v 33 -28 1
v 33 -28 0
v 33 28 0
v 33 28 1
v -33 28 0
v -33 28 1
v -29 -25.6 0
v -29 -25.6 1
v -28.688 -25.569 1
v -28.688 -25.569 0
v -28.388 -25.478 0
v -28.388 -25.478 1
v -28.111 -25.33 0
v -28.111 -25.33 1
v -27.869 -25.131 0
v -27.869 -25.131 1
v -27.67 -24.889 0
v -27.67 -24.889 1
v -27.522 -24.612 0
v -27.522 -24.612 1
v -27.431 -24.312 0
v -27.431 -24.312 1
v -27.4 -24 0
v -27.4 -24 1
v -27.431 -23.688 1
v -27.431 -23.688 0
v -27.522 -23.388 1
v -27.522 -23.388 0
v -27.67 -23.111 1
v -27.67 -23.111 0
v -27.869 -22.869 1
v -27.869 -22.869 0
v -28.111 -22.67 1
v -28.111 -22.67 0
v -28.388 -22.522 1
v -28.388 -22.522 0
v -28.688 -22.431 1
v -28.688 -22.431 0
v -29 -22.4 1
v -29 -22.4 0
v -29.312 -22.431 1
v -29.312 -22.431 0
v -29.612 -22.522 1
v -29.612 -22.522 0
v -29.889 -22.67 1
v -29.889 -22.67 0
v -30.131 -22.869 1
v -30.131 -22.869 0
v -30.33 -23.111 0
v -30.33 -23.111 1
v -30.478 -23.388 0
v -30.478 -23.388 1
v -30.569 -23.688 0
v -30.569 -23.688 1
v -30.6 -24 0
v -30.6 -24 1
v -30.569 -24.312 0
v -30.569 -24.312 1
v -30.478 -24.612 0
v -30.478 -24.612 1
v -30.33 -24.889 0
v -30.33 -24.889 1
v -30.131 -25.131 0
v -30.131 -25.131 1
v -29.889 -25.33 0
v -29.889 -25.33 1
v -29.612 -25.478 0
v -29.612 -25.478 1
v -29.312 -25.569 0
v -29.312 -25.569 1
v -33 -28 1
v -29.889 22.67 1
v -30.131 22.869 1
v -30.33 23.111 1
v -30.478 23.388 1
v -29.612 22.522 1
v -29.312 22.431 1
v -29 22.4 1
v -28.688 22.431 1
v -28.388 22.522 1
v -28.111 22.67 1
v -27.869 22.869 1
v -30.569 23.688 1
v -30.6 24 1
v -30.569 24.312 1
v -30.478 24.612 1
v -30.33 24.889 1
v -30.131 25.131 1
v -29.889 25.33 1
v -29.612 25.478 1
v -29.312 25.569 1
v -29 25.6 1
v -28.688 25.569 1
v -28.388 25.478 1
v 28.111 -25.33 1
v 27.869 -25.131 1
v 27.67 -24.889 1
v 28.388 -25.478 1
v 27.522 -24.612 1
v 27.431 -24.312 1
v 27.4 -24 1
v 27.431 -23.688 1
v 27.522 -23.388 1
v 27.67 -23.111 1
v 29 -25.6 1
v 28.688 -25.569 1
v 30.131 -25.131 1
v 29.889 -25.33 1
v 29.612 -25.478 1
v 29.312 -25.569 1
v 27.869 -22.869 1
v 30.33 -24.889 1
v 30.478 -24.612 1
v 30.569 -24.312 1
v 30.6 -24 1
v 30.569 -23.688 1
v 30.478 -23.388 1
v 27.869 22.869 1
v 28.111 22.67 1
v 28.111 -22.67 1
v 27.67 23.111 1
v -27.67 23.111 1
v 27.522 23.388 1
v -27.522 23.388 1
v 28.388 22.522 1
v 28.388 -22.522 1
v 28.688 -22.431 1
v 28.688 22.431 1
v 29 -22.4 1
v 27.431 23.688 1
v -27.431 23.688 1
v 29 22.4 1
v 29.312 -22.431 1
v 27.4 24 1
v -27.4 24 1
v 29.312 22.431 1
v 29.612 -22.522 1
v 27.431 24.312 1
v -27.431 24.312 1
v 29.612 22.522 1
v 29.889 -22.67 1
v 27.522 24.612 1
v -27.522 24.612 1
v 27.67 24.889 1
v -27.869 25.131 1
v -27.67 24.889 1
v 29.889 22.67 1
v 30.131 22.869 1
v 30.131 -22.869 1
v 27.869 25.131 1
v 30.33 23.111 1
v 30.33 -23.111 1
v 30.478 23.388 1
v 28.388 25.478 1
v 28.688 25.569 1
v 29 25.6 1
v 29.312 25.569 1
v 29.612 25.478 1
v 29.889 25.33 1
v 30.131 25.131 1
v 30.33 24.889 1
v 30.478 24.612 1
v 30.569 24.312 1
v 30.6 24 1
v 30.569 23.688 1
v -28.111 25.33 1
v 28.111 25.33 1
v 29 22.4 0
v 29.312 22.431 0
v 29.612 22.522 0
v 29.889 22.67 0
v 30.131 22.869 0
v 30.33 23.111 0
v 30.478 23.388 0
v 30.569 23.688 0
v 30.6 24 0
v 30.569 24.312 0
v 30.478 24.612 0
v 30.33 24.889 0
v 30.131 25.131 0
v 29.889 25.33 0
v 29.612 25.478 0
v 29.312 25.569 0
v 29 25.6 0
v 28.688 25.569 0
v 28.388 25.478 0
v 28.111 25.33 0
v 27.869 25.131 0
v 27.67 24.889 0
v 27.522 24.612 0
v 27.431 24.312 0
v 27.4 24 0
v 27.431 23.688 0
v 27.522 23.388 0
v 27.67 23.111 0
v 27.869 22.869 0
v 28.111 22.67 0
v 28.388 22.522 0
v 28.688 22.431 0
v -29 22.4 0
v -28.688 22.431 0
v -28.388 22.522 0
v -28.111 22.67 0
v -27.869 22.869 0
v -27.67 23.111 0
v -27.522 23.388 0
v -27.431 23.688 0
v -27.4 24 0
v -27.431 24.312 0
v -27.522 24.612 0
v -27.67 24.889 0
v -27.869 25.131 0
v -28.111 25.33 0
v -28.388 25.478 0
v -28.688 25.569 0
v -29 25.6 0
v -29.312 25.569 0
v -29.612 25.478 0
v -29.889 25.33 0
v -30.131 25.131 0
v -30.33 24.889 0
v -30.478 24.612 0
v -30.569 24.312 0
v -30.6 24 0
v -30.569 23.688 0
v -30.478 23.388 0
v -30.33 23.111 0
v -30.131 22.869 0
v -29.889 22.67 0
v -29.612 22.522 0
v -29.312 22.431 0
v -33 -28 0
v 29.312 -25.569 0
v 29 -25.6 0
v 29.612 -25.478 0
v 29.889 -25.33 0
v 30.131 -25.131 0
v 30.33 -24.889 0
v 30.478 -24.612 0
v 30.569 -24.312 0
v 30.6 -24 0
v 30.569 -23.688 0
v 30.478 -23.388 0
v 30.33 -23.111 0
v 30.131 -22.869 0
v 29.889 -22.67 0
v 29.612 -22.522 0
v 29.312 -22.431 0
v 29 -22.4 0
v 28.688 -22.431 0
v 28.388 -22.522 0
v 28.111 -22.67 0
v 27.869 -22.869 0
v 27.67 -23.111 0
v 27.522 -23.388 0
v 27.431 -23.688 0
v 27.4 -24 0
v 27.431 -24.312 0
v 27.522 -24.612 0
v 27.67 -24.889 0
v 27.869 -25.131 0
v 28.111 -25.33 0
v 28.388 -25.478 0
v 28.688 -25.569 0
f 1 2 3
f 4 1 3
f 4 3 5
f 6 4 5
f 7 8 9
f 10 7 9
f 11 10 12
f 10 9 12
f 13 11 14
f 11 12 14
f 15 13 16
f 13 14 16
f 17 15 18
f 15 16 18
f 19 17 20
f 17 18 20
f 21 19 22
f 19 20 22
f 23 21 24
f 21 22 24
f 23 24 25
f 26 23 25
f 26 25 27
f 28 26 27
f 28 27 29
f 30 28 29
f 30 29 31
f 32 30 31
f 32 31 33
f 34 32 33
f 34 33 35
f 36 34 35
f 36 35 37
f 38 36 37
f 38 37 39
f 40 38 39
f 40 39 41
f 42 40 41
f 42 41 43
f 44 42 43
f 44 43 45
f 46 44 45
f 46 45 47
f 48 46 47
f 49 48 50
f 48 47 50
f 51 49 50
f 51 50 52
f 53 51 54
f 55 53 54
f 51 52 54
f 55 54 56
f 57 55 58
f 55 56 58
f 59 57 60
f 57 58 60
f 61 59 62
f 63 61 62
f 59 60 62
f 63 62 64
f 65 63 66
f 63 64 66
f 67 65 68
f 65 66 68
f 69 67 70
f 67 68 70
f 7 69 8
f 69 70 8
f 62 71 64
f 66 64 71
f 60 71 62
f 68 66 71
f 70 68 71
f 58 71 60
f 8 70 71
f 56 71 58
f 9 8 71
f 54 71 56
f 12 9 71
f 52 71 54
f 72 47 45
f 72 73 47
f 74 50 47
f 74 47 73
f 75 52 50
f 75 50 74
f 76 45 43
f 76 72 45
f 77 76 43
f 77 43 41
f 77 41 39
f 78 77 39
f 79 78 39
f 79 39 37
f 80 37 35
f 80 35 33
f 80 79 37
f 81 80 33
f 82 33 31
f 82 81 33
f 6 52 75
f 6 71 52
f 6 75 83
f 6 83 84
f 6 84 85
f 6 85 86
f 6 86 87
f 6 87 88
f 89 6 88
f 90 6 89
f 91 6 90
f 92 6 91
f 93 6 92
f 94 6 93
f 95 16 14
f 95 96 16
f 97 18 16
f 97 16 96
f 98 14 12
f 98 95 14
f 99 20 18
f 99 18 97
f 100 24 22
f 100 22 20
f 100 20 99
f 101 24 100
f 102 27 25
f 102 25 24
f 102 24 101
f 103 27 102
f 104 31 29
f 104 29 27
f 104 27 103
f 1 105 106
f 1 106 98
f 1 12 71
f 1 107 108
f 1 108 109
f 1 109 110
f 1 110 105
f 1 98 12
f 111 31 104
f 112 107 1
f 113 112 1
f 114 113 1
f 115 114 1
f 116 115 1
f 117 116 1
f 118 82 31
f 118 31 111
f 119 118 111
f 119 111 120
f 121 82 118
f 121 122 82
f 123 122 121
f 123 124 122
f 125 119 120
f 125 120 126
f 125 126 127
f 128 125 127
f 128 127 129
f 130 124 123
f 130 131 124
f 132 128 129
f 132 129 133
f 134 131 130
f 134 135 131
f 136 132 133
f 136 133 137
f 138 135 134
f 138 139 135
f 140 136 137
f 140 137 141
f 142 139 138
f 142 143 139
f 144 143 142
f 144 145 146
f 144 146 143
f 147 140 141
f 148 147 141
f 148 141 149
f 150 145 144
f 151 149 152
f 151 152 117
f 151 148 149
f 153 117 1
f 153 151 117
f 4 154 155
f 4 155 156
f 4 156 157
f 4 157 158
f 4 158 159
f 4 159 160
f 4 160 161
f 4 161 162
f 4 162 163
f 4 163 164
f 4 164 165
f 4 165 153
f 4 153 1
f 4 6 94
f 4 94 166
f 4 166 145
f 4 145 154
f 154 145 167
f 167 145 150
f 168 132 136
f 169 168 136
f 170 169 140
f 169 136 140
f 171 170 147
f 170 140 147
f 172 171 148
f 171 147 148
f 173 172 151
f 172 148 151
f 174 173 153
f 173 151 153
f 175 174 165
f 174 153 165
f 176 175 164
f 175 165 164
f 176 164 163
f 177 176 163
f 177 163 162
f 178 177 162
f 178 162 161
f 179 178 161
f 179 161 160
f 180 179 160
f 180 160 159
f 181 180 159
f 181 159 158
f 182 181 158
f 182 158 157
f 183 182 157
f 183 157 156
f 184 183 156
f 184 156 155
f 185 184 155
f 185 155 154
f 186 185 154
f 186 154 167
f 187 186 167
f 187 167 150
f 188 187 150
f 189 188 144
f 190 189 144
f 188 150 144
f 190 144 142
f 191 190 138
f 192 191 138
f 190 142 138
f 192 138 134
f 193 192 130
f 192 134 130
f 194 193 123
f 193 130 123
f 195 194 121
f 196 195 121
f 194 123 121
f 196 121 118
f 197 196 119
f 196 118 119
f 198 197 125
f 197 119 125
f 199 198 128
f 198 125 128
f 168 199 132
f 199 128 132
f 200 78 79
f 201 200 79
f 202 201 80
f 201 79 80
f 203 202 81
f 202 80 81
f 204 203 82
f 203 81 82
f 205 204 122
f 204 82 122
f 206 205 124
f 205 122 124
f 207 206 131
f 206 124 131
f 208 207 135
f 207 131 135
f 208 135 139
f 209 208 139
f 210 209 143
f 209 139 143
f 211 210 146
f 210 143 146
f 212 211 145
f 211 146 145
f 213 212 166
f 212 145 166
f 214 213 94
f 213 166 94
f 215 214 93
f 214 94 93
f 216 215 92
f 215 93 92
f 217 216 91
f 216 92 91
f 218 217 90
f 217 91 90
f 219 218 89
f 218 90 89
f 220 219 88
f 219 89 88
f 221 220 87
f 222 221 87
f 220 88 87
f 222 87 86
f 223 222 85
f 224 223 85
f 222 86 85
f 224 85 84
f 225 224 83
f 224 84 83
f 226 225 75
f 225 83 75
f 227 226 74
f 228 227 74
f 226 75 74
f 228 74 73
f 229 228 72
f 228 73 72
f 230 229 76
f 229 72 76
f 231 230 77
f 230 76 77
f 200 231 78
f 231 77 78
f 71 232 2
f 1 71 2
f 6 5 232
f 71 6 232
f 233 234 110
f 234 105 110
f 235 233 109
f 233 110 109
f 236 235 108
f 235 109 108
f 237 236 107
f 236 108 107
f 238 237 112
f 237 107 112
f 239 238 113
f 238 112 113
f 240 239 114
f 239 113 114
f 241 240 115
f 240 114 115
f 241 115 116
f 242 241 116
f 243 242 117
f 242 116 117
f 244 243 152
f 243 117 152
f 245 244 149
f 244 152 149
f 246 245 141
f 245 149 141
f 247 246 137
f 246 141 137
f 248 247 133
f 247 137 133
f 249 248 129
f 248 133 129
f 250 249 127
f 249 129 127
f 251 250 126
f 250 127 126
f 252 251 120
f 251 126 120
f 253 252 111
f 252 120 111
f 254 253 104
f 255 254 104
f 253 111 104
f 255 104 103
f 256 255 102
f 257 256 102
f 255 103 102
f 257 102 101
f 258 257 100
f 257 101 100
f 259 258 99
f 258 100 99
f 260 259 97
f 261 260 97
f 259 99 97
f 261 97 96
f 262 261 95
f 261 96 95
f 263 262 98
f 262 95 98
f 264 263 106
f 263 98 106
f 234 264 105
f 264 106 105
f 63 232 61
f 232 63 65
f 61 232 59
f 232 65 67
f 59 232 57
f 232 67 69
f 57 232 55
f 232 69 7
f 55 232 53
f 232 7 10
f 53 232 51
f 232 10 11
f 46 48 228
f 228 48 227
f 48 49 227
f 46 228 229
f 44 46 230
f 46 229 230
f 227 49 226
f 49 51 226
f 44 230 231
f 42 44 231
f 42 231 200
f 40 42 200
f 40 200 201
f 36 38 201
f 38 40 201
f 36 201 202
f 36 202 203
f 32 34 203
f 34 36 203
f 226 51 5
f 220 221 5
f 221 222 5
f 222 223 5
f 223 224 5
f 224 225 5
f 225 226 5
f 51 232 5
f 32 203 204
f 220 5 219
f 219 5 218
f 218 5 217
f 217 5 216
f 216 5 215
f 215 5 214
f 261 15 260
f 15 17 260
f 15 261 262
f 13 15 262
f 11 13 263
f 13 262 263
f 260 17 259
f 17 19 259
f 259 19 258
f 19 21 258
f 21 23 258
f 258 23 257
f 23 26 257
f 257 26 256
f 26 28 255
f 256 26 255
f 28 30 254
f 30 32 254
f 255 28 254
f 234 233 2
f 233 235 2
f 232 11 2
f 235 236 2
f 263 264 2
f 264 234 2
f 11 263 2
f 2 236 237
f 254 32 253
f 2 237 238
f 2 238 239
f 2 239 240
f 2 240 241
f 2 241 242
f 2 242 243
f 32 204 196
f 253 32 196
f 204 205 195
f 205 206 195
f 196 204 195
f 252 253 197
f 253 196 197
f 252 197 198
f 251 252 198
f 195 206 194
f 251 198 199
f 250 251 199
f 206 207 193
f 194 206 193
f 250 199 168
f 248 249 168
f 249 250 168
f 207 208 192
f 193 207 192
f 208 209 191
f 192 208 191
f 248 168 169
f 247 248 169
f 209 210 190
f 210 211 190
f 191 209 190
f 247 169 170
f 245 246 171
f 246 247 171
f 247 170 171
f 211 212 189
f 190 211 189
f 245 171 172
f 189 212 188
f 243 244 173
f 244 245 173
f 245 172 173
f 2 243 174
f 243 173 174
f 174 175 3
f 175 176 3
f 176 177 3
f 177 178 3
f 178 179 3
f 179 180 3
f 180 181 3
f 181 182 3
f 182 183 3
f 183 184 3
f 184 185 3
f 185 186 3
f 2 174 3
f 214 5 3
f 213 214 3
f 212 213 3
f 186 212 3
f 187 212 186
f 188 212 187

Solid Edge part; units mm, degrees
sketch "Sketch1" plane through (0, 0, 0) normal (0, 0, 1) x (1, 0, 0)
  line L0 (-33, -28) -> (33, -28)
  line L1 (33, -28) -> (33, 28)
  line L2 (33, 28) -> (-33, 28)
  line L3 (-33, 28) -> (-33, -28)
  dimension "D1" = 66
  dimension "D2" = 56
extrude "Protrusion1" add sketch "Sketch1" along normal blind 1
hole "Hole_1" at (-29, 24, 1) direction (0, 0, -1) diameter 3.2 end up to next
hole "Hole1" at (29, 24, 1) direction (0, 0, -1) diameter 3.2 end up to next
hole "Hole2" at (-29, -24, 1) direction (0, 0, -1) diameter 3.2 end up to next
hole "Hole3" at (29, -24, 1) direction (0, 0, -1) diameter 3.2 end up to next
properties material "Polyethylene, low density"
